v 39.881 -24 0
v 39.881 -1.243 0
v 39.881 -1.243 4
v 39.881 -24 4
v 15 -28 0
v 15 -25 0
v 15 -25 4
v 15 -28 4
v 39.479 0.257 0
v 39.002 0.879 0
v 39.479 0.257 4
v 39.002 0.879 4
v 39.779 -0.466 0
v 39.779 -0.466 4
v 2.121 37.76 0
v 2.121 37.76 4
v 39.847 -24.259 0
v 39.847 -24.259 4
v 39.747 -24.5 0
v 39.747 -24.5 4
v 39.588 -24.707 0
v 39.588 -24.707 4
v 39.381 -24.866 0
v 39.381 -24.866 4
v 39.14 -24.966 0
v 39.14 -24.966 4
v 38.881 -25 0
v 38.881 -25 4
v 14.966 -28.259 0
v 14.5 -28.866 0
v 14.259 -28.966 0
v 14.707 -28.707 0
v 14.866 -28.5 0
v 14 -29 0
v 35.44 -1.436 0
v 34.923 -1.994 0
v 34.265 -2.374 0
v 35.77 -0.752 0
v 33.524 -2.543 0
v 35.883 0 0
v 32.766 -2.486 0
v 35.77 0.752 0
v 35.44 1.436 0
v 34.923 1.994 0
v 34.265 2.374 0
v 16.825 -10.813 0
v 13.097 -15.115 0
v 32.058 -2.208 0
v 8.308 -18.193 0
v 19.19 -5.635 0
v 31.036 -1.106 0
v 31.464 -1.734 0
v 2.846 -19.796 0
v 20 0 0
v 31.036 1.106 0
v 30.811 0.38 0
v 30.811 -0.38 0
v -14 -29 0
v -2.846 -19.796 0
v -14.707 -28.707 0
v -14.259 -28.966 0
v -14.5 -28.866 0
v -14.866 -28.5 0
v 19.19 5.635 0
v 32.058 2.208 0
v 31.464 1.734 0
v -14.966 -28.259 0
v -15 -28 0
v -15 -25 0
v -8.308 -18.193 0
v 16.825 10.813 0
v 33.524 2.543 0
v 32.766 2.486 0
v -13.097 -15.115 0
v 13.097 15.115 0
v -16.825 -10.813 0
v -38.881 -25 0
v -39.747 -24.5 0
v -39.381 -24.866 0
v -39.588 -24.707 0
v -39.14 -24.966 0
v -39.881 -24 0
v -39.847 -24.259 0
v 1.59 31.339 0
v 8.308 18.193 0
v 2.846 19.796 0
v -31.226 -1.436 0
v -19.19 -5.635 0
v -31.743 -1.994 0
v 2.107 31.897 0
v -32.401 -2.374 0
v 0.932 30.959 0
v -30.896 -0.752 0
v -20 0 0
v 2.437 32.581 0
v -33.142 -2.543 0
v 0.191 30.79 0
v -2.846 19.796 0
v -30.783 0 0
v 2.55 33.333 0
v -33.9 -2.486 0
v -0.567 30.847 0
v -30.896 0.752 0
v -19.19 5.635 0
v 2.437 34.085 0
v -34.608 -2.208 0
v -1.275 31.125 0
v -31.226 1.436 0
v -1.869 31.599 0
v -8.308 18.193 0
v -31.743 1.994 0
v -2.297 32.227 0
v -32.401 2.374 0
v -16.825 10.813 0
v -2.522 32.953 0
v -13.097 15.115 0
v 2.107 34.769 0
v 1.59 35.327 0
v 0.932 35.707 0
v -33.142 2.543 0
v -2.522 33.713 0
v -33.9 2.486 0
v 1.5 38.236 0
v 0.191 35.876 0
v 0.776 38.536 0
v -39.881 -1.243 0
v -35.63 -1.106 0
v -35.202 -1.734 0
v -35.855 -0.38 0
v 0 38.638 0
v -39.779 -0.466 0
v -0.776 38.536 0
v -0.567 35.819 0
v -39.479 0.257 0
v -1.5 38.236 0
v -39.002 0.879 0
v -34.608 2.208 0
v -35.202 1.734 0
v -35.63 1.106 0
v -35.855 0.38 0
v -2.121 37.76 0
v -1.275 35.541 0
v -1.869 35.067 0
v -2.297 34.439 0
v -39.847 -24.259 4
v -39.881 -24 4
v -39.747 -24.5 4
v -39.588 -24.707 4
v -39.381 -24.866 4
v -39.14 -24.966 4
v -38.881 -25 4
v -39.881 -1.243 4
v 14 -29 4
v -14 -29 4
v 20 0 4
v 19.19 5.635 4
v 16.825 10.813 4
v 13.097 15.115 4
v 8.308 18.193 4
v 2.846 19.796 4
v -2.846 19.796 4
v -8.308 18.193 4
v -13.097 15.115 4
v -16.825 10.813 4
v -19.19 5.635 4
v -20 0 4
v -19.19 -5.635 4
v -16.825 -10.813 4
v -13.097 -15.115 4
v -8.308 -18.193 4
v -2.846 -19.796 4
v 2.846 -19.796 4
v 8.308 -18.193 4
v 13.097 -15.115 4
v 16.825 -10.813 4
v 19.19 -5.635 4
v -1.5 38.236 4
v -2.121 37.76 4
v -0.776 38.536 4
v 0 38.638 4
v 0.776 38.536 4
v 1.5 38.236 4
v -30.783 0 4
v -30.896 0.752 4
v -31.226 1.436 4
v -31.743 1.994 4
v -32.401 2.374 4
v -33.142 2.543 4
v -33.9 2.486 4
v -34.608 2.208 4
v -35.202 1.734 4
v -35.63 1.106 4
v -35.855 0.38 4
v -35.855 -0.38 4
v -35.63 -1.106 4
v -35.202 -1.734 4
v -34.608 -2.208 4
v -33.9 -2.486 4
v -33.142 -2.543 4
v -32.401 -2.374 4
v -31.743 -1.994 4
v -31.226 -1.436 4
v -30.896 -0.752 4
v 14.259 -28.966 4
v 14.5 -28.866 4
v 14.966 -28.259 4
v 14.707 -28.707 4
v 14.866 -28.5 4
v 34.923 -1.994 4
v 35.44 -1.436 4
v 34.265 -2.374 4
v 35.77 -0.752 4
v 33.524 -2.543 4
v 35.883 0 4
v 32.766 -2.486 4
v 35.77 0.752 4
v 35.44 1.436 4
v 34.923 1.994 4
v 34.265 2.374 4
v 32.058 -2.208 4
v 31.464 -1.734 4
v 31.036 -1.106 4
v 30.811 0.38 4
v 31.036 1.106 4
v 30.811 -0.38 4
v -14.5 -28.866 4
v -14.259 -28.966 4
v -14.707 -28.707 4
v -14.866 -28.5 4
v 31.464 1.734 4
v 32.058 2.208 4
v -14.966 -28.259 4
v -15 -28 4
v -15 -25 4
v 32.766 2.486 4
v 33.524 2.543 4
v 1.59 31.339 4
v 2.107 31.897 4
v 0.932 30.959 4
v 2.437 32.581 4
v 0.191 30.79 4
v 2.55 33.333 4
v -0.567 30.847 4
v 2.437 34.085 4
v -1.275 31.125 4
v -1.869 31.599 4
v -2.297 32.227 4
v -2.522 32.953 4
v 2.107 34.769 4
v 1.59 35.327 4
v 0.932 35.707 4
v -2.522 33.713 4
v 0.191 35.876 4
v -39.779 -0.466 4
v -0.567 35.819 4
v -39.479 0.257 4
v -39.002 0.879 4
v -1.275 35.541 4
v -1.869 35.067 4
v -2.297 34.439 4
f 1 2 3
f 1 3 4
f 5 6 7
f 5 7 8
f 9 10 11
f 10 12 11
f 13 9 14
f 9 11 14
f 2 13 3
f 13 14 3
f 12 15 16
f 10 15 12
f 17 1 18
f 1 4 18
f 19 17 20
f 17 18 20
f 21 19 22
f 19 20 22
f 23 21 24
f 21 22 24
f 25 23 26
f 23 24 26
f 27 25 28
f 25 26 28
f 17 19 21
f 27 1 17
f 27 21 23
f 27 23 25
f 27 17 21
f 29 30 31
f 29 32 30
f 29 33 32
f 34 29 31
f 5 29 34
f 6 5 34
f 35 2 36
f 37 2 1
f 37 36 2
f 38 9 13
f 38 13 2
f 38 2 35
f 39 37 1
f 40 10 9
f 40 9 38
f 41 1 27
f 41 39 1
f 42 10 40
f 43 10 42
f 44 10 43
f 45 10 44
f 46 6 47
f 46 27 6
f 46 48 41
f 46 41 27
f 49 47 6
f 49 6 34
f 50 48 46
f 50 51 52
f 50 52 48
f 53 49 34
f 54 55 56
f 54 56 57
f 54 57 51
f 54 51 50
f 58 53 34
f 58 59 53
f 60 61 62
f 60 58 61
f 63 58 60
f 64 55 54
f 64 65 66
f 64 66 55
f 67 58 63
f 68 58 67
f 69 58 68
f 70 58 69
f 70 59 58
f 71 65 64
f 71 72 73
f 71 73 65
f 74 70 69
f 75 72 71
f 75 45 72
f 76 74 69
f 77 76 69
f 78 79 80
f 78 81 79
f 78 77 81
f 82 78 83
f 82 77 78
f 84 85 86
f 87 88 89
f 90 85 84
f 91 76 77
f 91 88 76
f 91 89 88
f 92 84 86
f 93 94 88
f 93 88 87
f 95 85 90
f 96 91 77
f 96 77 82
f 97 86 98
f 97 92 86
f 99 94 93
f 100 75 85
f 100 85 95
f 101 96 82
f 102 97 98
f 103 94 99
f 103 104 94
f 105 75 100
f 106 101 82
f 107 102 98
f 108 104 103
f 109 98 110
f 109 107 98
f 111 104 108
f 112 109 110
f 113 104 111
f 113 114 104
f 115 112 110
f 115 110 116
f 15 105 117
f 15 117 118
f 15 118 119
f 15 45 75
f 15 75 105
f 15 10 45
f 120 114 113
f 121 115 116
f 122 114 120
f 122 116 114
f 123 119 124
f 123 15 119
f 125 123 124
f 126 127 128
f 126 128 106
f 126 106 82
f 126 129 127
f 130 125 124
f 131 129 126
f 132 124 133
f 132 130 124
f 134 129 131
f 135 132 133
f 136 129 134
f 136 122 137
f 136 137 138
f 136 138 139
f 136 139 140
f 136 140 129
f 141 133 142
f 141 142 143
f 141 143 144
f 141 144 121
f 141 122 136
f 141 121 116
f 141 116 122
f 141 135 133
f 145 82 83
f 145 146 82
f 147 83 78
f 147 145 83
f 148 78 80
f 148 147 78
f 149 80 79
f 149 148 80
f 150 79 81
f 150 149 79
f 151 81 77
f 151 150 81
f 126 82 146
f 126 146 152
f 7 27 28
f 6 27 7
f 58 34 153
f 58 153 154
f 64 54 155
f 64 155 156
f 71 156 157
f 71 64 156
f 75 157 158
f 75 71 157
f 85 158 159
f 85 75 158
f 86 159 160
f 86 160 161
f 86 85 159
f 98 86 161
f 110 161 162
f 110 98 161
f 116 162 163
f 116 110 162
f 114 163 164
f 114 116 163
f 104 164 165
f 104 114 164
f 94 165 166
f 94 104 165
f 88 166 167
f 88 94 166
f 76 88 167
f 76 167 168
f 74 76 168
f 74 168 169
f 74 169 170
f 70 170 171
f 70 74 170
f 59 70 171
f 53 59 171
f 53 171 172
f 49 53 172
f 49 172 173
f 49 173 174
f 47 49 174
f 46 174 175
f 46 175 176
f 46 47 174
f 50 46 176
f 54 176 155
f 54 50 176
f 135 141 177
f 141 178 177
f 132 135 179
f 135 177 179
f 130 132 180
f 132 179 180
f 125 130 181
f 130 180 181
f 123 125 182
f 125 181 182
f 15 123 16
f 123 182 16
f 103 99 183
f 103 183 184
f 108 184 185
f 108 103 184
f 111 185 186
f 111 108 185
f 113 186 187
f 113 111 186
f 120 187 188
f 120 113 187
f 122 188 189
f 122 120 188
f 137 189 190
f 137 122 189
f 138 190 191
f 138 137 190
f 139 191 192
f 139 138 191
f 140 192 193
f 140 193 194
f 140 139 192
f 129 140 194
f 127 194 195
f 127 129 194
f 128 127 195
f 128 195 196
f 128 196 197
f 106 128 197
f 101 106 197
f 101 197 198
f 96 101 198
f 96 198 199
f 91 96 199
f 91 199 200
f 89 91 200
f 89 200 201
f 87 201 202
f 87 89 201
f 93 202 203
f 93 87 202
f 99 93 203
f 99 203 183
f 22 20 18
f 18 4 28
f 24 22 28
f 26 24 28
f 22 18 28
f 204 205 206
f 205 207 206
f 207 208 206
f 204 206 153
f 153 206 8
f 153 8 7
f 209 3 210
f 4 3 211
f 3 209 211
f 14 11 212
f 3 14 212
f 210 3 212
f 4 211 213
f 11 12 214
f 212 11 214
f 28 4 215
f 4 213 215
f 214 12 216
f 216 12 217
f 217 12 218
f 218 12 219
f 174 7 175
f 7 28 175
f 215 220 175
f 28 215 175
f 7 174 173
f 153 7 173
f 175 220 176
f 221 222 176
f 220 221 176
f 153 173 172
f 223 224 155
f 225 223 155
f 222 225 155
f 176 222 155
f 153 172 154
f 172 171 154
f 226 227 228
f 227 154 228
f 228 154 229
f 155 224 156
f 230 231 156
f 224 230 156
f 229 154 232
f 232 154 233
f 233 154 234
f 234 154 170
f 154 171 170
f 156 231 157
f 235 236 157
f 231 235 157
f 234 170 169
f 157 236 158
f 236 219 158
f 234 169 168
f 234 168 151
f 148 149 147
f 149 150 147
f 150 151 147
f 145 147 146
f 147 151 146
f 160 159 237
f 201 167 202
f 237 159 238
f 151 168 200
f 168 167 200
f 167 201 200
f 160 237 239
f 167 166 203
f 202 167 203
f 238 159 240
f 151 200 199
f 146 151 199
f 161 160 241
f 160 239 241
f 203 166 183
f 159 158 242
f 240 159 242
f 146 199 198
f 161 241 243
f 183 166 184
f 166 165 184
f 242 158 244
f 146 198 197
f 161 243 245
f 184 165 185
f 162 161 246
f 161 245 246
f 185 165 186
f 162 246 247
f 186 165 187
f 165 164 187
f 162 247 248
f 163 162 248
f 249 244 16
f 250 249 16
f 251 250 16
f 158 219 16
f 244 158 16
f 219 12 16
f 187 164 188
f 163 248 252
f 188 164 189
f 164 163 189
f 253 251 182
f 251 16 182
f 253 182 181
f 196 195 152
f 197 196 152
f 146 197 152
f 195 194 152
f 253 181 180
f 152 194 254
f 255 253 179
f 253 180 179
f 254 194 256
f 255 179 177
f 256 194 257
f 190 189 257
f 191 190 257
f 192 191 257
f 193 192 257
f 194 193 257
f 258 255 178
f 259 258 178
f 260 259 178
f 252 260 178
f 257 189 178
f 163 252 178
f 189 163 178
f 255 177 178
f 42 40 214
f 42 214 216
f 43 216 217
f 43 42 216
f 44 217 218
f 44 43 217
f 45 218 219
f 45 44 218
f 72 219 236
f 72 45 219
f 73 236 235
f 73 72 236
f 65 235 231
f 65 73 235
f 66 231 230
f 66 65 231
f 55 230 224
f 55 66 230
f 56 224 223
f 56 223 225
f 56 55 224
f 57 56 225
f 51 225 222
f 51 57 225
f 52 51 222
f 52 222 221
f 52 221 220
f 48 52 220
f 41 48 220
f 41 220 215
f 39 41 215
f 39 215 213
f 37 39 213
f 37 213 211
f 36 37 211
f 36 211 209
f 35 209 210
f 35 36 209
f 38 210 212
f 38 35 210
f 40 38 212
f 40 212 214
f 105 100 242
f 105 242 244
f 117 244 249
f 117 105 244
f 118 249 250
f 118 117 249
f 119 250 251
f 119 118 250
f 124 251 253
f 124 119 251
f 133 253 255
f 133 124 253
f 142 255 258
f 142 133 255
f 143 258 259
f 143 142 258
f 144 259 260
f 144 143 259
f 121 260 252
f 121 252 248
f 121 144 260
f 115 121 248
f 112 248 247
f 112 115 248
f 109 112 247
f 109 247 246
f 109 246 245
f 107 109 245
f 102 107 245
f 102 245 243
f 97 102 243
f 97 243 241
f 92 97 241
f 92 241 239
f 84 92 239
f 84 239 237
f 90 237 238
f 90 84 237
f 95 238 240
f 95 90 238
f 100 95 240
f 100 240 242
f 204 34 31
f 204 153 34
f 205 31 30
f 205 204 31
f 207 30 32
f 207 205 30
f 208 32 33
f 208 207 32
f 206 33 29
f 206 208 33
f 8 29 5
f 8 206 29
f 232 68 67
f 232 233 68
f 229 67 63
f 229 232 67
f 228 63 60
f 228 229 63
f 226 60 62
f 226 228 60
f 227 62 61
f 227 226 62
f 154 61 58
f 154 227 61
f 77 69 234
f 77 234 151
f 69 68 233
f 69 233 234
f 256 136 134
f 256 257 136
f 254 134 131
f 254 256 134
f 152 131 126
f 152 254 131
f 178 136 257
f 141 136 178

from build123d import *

# Parameters (mm, degrees)
SKETCH_1_R      = 20
SKETCH_1_R_2    = 2.55
EXTRUDE_2_DEPTH = 4
FILLET_1_R      = 3
FILLET_2_R      = 1


with BuildPart() as part:
    # Эскиз1 → Бобышка-Вытянуть2 (new body)
    with BuildSketch(Plane.XY):
        Polygon((-39.880822459, 0), (0, 39.880822459), (39.880822459, 0), (39.880822459, -25), (15, -25), (15, -29), (-15, -29), (-15, -25), (-39.880822459, -25), align=None)
        Circle(SKETCH_1_R, mode=Mode.SUBTRACT)
        with Locations((-33.333013665, 0)):
            Circle(SKETCH_1_R_2, mode=Mode.SUBTRACT)
        with Locations((0, 33.333013665)):
            Circle(SKETCH_1_R_2, mode=Mode.SUBTRACT)
        with Locations((33.333013665, 0)):
            Circle(SKETCH_1_R_2, mode=Mode.SUBTRACT)
    extrude(amount=EXTRUDE_2_DEPTH)

    # Скругление1
    fillet_1_edges = [part.edges().sort_by_distance(p)[0] for p in [
        (-39.880822459, 0, 2),
        (0, 39.880822459, 2),
        (39.880822459, 0, 2),
    ]]
    fillet(fillet_1_edges, radius=FILLET_1_R)

    # Скругление2
    fillet_2_edges = [part.edges().sort_by_distance(p)[0] for p in [
        (39.880822459, -25, 2),
        (15, -29, 2),
        (-15, -29, 2),
        (-39.880822459, -25, 2),
    ]]
    fillet(fillet_2_edges, radius=FILLET_2_R)


solid = part.part
